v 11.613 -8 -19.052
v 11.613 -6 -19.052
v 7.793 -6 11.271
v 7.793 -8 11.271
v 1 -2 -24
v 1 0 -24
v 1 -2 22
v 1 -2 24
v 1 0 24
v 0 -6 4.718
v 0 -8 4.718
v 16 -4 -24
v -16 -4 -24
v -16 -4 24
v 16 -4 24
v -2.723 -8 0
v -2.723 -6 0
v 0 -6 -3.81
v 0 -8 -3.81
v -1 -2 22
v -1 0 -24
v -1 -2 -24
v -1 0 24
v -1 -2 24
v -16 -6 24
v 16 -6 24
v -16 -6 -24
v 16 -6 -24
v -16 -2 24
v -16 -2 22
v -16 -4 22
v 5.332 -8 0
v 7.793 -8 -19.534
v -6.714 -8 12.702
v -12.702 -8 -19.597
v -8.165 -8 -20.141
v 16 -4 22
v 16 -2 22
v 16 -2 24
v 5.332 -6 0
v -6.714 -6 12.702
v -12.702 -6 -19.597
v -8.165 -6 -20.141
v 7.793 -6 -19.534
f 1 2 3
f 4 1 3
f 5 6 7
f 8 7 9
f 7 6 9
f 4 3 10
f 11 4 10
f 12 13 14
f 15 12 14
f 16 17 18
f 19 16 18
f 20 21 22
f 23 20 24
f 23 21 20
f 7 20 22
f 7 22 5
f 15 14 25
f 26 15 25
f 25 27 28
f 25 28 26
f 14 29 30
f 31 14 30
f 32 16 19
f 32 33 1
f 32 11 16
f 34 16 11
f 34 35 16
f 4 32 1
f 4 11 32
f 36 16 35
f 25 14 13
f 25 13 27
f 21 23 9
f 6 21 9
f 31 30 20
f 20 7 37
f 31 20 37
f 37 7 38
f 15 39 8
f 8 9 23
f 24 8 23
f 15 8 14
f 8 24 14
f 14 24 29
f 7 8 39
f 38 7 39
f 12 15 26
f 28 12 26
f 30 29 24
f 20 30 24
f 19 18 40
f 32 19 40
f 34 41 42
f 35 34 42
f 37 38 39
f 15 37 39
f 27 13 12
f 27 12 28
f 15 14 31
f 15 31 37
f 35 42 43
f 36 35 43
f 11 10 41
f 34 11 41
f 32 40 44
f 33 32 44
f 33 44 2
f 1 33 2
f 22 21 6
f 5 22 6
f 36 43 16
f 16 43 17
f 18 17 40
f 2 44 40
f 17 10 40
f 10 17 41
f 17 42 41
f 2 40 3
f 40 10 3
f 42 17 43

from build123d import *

# Parameters (mm, degrees)
F0_W     = 2
F0_H     = 48
F1_DEPTH = 2
F3_DEPTH = 2
F4_W     = 2
F4_H     = 48
F5_DEPTH = 32
F7_DEPTH = 2


with BuildPart() as f1:
    # F0 (on Front) → F1 (new body)
    with BuildSketch(Plane.XZ):
        Rectangle(F0_W, F0_H)
    extrude(amount=F1_DEPTH)

    # F2 (on face) → F3 (join)
    with BuildSketch(Plane.XZ.offset(2)):
        Polygon((16, 24), (-1, 24), (-16, 24), (-16, 22), (16, 22), align=None)
    extrude(amount=F3_DEPTH)


with BuildPart() as f5:
    # F4 (on face) → F5 (new body)
    with BuildSketch(Plane(origin=(-16, 0, 0), x_dir=(0, -1, 0), z_dir=(-1, 0, 0))):
        with Locations((5, 0)):
            Rectangle(F4_W, F4_H)
    extrude(amount=-F5_DEPTH)


with BuildPart() as f7:
    # F6 (on face) → F7 (new body)
    with BuildSketch(Plane.XZ.offset(6)):
        Polygon((-6.71371, 12.701613), (-12.701614, -19.596776), (-8.165322, -20.14113), (-2.722958, 0), (0, -3.810484), (5.332359, 0), (7.793031, -19.533614), (11.612904, -19.05242), (7.793031, 11.270973), (0, 4.717742), align=None)
    extrude(amount=F7_DEPTH)


solid = Compound([f1.part, f5.part, f7.part])
